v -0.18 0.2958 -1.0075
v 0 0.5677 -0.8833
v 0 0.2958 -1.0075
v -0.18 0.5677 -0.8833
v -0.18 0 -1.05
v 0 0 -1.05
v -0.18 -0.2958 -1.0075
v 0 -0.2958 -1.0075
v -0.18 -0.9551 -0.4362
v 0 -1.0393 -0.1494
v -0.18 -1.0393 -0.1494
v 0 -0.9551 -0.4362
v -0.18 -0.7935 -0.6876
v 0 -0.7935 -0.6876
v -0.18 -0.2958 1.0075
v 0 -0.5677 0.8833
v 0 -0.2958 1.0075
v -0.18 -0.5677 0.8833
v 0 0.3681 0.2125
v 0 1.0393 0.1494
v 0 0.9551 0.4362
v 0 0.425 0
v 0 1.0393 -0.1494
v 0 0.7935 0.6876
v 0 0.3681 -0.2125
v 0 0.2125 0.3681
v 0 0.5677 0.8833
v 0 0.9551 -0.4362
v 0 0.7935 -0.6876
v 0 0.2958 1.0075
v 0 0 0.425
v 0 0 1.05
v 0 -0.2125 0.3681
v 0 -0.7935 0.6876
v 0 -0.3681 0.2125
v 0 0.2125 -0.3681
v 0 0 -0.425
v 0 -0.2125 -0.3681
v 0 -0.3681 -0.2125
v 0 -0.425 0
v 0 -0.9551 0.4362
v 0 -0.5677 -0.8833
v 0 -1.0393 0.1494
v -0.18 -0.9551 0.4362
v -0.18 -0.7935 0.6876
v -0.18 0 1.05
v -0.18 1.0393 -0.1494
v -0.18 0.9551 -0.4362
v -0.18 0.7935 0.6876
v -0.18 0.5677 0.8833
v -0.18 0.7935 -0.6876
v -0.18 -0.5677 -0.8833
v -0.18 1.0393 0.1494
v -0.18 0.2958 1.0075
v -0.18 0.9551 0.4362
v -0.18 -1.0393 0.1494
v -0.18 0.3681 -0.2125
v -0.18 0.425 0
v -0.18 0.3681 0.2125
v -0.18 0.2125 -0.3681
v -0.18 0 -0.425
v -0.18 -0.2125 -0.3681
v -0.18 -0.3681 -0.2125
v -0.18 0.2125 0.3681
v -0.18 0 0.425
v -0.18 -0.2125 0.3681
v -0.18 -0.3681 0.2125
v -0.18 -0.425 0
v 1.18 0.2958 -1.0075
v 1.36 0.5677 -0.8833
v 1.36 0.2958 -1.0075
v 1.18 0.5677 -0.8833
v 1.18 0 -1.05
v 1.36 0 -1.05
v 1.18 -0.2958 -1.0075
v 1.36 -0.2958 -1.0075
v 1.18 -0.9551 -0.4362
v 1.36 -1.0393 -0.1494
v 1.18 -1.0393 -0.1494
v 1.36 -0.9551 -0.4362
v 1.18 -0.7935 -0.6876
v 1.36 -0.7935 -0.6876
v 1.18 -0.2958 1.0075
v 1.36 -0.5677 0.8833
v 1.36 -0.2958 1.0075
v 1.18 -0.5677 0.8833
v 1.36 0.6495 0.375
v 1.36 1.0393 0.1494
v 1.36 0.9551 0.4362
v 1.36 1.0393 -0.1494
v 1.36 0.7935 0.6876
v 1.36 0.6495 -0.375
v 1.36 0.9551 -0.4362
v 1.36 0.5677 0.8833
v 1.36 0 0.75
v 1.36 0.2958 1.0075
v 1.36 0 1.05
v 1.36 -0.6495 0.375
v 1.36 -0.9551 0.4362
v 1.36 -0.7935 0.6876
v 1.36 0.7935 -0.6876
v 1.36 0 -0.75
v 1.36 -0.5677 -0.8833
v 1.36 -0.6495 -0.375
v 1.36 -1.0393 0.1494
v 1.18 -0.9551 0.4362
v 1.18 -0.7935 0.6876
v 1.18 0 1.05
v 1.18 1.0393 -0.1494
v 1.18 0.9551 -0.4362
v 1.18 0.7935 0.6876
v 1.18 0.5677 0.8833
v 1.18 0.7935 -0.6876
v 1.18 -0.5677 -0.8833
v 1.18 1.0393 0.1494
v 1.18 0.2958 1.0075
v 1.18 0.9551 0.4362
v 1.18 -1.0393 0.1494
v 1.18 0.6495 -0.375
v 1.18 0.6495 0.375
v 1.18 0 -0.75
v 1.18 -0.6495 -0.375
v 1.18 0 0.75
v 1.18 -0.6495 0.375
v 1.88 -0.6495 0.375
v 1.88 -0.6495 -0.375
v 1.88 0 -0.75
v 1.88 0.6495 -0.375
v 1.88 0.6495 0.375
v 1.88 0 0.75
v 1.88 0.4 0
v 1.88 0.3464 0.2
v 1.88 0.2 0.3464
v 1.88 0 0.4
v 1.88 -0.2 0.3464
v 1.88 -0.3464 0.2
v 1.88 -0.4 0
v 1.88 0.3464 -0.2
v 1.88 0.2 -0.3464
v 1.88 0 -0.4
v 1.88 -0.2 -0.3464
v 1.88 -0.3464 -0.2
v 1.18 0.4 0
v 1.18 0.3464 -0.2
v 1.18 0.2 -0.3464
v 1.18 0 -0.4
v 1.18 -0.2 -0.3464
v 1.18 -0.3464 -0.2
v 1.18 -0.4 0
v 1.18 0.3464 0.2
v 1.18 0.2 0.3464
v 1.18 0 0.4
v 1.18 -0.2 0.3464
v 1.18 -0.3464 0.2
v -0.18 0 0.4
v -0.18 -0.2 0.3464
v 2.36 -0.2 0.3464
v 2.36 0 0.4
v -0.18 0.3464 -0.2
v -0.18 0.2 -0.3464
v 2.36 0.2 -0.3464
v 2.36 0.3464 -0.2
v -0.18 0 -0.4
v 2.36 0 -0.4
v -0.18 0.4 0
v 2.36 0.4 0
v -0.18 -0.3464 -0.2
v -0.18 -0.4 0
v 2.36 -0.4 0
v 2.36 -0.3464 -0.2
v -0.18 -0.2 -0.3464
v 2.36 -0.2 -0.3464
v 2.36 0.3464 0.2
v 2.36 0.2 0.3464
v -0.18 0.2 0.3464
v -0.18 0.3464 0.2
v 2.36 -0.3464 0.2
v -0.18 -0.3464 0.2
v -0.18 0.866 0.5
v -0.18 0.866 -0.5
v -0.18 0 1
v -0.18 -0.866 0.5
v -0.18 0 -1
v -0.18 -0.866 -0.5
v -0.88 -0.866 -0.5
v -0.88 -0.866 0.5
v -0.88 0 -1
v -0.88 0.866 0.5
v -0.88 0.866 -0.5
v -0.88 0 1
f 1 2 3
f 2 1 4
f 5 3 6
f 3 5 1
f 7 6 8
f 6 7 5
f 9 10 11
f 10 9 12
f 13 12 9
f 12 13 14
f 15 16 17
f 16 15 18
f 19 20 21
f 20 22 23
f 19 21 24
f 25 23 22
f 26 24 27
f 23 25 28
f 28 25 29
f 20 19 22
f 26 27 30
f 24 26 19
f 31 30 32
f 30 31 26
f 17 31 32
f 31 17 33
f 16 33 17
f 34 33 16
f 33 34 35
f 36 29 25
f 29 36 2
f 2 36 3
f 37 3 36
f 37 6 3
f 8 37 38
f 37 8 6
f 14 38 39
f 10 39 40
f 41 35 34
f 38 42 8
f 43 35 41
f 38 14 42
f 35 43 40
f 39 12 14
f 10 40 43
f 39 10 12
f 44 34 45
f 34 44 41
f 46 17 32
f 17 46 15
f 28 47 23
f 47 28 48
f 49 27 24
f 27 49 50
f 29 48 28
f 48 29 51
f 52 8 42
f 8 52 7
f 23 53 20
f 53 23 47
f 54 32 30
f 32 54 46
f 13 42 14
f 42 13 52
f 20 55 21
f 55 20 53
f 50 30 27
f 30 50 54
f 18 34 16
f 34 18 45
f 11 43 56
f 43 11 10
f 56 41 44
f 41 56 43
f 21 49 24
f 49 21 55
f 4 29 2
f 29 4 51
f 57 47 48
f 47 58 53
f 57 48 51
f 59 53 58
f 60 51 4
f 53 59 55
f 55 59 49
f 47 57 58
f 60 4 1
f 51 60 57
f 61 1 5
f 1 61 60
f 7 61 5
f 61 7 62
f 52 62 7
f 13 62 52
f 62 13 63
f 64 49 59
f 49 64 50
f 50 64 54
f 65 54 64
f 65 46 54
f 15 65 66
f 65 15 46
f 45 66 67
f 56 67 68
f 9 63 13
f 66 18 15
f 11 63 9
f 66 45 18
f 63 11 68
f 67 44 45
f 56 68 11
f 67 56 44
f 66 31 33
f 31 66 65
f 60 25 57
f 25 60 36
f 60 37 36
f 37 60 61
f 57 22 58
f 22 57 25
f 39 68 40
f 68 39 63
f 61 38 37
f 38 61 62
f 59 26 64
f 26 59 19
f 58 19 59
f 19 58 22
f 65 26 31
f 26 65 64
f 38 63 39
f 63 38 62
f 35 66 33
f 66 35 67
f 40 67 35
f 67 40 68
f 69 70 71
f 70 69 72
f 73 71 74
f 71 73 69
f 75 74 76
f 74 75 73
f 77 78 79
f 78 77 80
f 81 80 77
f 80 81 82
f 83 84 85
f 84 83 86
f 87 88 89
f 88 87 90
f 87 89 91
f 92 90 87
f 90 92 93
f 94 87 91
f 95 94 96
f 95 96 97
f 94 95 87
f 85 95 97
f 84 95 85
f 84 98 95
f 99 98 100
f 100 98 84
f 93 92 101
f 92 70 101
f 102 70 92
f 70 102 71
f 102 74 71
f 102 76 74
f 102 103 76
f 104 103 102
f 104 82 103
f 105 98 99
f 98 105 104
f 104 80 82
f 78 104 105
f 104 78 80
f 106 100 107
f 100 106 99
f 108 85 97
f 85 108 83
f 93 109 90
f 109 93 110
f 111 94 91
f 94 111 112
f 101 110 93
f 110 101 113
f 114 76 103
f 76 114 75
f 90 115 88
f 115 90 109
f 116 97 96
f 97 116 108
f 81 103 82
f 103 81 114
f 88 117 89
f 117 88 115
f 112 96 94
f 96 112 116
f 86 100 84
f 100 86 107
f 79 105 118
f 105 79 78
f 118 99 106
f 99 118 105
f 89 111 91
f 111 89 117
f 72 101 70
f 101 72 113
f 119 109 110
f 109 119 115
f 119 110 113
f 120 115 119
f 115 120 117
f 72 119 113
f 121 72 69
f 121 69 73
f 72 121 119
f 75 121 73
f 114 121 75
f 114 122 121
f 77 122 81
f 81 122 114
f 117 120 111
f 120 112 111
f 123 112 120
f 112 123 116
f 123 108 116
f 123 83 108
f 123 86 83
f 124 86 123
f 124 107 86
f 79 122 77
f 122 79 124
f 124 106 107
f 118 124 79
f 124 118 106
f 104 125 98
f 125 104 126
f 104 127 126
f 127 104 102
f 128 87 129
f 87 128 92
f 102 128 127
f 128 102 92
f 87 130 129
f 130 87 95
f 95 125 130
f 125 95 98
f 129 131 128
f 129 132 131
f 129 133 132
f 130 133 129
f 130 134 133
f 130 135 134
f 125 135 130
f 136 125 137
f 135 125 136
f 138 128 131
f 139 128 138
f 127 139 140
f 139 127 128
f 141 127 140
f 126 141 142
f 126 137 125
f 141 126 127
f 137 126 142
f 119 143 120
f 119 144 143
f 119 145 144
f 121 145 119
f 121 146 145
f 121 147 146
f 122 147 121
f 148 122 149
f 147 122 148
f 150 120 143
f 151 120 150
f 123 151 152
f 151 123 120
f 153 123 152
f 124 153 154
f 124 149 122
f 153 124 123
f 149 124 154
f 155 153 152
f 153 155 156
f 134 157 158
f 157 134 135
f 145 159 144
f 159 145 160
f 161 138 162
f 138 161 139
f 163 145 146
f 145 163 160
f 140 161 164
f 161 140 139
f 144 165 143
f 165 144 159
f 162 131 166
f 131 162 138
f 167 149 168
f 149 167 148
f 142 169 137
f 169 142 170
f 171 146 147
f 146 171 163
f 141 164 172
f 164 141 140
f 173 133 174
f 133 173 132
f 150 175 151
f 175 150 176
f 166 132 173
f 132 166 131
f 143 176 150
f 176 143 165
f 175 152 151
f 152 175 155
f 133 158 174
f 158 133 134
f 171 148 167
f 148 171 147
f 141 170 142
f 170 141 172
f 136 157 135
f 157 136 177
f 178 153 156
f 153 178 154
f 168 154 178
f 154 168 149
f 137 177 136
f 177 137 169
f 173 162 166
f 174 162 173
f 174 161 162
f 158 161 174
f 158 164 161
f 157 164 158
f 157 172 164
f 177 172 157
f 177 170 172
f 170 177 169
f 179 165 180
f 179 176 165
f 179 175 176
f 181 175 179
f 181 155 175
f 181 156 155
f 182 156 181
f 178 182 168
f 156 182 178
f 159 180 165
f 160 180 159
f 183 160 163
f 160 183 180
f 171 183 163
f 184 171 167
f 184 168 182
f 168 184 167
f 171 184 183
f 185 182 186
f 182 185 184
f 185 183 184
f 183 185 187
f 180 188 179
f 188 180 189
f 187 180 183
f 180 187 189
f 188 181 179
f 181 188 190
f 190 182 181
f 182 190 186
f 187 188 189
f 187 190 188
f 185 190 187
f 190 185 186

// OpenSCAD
// file: nut.scad
module nut(rotation=0) 
{
    hex_diameter = 1.5;
    hex_length = 0.7;
    hole = 0.80;
     
    rotate([0,90,rotation]) 
    color([0.0,0.8,1.0])
    translate([0,0,hex_length*0.5]) 
    {
        difference() {
            cylinder(h=hex_length, r=hex_diameter/2, $fn = 6, center=true);
            cylinder(h=hex_length+0.1, r=hole/2, $fn = 12, center=true);
        }
    }
}

nut();
// file: washer.scad
module washer(rotation=0, thickness = 0.08) 
{
    diameter = 2.1;
    hole = 0.85;
    
    rotate([0,90,rotation]) 
    color([0.0,0.8,1.0])
    translate([0,0,thickness*0.5]) 
    {
        difference() {
            cylinder(h=thickness, r=diameter/2, $fn = 22, center=true);
            cylinder(h=thickness+0.1, r=hole/2, $fn = 12, center=true);
        }
    }
}

washer();
// main file
use <washer.scad> 
use <nut.scad> 


module bolt() 
{
    length = 2.54*1.0;
    material_thickness = 1.0;
    thickness = 0.8;
    hex_diameter = 2.0;
    hex_length = 0.7;
    washer_thickness = 0.18;
  
    color("DeepSkyBlue")
    translate([-washer_thickness,0,0])
    {
        rotate([0,90,0]) 
        {
            cylinder(h=length, r=thickness/2, $fn = 12);
            
            translate([0,0,-hex_length]) 
            cylinder(h=hex_length, r=hex_diameter/2, $fn = 6);
        
            translate([0,0, material_thickness + 2*washer_thickness])
            rotate([0,-90,0]) {
                washer(0, washer_thickness);
                nut(0);
            }
        }
        
        washer(0, washer_thickness);
    }
}

bolt();
